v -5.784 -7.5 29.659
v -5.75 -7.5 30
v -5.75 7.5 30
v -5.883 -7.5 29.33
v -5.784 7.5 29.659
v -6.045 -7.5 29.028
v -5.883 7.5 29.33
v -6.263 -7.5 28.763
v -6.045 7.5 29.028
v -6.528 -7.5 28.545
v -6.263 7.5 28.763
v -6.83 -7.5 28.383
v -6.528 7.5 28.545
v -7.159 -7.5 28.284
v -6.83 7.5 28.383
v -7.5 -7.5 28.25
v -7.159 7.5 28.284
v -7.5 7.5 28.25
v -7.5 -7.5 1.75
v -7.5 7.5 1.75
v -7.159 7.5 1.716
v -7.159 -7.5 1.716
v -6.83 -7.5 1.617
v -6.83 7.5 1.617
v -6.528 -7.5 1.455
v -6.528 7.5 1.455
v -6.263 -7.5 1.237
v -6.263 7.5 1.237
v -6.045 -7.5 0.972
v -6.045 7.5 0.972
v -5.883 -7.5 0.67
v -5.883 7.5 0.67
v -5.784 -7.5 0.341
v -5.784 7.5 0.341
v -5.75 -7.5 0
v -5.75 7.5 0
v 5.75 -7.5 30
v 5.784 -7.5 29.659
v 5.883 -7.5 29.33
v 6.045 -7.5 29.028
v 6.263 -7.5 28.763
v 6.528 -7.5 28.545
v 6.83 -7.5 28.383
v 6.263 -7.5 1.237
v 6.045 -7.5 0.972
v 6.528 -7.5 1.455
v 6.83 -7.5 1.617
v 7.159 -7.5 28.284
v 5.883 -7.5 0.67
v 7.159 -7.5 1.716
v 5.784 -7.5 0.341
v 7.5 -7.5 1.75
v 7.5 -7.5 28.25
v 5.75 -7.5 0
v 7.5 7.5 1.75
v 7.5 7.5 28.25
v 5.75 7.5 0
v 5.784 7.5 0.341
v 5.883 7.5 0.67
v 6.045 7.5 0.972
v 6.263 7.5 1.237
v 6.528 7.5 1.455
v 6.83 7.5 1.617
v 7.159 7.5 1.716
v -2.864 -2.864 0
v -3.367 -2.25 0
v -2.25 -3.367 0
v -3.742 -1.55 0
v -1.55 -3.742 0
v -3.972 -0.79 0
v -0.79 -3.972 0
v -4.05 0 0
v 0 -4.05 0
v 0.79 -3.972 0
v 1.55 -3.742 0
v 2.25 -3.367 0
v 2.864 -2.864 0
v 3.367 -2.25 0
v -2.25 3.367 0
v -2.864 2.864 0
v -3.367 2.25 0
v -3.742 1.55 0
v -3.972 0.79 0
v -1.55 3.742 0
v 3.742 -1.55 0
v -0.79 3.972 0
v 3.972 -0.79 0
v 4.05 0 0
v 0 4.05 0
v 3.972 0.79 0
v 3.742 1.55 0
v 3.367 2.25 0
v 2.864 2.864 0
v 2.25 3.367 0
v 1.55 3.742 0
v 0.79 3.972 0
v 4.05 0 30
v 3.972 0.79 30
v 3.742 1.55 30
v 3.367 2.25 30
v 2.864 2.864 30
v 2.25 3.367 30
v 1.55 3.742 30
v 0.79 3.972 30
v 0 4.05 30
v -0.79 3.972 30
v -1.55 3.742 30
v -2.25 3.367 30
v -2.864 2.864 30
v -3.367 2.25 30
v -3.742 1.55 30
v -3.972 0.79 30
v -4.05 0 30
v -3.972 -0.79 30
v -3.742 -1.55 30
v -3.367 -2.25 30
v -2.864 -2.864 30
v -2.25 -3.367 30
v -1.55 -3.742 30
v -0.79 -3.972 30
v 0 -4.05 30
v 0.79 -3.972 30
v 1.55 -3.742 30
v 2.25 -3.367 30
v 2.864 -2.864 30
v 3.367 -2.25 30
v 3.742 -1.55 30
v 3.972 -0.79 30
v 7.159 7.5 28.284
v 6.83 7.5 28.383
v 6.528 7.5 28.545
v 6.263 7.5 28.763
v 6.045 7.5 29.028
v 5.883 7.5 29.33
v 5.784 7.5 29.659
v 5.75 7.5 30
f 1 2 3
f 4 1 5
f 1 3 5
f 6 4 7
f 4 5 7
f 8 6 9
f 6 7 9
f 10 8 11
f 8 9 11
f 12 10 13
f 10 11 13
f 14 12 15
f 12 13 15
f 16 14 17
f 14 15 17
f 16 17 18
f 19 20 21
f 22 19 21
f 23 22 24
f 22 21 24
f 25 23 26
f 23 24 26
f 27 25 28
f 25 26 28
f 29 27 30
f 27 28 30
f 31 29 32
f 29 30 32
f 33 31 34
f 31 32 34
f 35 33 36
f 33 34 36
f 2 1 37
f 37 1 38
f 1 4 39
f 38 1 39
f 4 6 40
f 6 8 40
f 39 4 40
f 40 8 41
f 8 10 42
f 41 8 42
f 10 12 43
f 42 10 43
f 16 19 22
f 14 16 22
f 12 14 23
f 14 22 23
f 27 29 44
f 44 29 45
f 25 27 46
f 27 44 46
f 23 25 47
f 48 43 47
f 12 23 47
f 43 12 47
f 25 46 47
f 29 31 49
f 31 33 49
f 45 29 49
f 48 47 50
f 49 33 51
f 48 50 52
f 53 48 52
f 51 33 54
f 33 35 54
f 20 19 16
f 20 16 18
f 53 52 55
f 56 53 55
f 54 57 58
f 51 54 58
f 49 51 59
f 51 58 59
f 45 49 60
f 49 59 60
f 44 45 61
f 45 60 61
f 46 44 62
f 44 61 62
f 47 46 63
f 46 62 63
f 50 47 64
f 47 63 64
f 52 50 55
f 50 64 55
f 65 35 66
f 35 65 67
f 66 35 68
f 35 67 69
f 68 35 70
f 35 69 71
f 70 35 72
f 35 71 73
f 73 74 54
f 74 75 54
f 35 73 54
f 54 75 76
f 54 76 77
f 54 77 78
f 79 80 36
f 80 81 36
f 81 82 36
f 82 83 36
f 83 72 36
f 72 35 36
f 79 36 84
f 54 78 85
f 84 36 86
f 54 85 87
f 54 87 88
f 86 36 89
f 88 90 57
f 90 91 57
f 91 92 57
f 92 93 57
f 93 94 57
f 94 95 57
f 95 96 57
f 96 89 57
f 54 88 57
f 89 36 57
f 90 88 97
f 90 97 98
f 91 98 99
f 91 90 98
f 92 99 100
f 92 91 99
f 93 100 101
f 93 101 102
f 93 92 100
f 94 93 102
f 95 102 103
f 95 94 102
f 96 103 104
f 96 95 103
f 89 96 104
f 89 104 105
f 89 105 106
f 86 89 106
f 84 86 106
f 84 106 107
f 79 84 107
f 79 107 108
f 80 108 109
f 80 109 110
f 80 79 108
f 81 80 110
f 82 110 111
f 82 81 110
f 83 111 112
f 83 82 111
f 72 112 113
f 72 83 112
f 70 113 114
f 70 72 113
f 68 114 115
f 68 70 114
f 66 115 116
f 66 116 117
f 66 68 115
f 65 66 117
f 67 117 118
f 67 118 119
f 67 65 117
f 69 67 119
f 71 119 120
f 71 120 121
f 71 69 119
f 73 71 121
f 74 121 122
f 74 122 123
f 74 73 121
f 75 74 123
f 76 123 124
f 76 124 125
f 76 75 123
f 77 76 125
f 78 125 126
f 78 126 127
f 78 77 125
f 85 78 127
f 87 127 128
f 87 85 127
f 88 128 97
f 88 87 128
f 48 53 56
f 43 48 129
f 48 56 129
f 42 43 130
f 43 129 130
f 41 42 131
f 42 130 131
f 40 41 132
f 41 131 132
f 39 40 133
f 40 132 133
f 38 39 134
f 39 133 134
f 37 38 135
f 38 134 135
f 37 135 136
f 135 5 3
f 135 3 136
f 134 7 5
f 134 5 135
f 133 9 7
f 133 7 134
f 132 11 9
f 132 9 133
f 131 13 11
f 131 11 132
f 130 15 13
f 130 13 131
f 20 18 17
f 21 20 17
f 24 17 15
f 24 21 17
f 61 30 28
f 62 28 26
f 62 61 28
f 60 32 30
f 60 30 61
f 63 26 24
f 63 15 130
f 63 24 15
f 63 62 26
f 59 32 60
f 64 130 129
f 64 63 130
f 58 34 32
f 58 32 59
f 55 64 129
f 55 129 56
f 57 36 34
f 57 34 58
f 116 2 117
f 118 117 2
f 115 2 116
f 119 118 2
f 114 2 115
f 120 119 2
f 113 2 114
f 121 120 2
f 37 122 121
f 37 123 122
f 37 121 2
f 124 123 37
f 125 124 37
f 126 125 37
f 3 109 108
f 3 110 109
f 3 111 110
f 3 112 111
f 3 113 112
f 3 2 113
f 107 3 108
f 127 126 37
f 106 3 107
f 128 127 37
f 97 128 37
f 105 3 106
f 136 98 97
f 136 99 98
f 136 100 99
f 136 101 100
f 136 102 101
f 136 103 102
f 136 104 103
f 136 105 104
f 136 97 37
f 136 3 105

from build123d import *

# Parameters (mm, degrees)
SKETCH1_W           = 15
SKETCH1_H           = 15
SKETCH1_R           = 4.05
BOSS_EXTRUDE1_DEPTH = 30
SKETCH2_R           = 1.75
CUT_EXTRUDE1_DEPTH  = 35.369317712


with BuildPart() as part:
    # Sketch1 → Boss-Extrude1 (new body)
    with BuildSketch(Plane.XY):
        Rectangle(SKETCH1_W, SKETCH1_H)
        Circle(SKETCH1_R, mode=Mode.SUBTRACT)
    extrude(amount=BOSS_EXTRUDE1_DEPTH)

    # Sketch2 → Cut-Extrude1 (cut, through all)
    with BuildSketch(Plane(origin=(0, 7.5, 0), x_dir=(1, 0, 0), z_dir=(0, 1, 0))):
        with Locations((7.5, -30)):
            Circle(SKETCH2_R)
        with Locations((7.5, 0)):
            Circle(SKETCH2_R)
        with Locations((-7.5, 0)):
            Circle(SKETCH2_R)
        with Locations((-7.5, -30)):
            Circle(SKETCH2_R)
    extrude(amount=-CUT_EXTRUDE1_DEPTH, mode=Mode.SUBTRACT)


solid = part.part
